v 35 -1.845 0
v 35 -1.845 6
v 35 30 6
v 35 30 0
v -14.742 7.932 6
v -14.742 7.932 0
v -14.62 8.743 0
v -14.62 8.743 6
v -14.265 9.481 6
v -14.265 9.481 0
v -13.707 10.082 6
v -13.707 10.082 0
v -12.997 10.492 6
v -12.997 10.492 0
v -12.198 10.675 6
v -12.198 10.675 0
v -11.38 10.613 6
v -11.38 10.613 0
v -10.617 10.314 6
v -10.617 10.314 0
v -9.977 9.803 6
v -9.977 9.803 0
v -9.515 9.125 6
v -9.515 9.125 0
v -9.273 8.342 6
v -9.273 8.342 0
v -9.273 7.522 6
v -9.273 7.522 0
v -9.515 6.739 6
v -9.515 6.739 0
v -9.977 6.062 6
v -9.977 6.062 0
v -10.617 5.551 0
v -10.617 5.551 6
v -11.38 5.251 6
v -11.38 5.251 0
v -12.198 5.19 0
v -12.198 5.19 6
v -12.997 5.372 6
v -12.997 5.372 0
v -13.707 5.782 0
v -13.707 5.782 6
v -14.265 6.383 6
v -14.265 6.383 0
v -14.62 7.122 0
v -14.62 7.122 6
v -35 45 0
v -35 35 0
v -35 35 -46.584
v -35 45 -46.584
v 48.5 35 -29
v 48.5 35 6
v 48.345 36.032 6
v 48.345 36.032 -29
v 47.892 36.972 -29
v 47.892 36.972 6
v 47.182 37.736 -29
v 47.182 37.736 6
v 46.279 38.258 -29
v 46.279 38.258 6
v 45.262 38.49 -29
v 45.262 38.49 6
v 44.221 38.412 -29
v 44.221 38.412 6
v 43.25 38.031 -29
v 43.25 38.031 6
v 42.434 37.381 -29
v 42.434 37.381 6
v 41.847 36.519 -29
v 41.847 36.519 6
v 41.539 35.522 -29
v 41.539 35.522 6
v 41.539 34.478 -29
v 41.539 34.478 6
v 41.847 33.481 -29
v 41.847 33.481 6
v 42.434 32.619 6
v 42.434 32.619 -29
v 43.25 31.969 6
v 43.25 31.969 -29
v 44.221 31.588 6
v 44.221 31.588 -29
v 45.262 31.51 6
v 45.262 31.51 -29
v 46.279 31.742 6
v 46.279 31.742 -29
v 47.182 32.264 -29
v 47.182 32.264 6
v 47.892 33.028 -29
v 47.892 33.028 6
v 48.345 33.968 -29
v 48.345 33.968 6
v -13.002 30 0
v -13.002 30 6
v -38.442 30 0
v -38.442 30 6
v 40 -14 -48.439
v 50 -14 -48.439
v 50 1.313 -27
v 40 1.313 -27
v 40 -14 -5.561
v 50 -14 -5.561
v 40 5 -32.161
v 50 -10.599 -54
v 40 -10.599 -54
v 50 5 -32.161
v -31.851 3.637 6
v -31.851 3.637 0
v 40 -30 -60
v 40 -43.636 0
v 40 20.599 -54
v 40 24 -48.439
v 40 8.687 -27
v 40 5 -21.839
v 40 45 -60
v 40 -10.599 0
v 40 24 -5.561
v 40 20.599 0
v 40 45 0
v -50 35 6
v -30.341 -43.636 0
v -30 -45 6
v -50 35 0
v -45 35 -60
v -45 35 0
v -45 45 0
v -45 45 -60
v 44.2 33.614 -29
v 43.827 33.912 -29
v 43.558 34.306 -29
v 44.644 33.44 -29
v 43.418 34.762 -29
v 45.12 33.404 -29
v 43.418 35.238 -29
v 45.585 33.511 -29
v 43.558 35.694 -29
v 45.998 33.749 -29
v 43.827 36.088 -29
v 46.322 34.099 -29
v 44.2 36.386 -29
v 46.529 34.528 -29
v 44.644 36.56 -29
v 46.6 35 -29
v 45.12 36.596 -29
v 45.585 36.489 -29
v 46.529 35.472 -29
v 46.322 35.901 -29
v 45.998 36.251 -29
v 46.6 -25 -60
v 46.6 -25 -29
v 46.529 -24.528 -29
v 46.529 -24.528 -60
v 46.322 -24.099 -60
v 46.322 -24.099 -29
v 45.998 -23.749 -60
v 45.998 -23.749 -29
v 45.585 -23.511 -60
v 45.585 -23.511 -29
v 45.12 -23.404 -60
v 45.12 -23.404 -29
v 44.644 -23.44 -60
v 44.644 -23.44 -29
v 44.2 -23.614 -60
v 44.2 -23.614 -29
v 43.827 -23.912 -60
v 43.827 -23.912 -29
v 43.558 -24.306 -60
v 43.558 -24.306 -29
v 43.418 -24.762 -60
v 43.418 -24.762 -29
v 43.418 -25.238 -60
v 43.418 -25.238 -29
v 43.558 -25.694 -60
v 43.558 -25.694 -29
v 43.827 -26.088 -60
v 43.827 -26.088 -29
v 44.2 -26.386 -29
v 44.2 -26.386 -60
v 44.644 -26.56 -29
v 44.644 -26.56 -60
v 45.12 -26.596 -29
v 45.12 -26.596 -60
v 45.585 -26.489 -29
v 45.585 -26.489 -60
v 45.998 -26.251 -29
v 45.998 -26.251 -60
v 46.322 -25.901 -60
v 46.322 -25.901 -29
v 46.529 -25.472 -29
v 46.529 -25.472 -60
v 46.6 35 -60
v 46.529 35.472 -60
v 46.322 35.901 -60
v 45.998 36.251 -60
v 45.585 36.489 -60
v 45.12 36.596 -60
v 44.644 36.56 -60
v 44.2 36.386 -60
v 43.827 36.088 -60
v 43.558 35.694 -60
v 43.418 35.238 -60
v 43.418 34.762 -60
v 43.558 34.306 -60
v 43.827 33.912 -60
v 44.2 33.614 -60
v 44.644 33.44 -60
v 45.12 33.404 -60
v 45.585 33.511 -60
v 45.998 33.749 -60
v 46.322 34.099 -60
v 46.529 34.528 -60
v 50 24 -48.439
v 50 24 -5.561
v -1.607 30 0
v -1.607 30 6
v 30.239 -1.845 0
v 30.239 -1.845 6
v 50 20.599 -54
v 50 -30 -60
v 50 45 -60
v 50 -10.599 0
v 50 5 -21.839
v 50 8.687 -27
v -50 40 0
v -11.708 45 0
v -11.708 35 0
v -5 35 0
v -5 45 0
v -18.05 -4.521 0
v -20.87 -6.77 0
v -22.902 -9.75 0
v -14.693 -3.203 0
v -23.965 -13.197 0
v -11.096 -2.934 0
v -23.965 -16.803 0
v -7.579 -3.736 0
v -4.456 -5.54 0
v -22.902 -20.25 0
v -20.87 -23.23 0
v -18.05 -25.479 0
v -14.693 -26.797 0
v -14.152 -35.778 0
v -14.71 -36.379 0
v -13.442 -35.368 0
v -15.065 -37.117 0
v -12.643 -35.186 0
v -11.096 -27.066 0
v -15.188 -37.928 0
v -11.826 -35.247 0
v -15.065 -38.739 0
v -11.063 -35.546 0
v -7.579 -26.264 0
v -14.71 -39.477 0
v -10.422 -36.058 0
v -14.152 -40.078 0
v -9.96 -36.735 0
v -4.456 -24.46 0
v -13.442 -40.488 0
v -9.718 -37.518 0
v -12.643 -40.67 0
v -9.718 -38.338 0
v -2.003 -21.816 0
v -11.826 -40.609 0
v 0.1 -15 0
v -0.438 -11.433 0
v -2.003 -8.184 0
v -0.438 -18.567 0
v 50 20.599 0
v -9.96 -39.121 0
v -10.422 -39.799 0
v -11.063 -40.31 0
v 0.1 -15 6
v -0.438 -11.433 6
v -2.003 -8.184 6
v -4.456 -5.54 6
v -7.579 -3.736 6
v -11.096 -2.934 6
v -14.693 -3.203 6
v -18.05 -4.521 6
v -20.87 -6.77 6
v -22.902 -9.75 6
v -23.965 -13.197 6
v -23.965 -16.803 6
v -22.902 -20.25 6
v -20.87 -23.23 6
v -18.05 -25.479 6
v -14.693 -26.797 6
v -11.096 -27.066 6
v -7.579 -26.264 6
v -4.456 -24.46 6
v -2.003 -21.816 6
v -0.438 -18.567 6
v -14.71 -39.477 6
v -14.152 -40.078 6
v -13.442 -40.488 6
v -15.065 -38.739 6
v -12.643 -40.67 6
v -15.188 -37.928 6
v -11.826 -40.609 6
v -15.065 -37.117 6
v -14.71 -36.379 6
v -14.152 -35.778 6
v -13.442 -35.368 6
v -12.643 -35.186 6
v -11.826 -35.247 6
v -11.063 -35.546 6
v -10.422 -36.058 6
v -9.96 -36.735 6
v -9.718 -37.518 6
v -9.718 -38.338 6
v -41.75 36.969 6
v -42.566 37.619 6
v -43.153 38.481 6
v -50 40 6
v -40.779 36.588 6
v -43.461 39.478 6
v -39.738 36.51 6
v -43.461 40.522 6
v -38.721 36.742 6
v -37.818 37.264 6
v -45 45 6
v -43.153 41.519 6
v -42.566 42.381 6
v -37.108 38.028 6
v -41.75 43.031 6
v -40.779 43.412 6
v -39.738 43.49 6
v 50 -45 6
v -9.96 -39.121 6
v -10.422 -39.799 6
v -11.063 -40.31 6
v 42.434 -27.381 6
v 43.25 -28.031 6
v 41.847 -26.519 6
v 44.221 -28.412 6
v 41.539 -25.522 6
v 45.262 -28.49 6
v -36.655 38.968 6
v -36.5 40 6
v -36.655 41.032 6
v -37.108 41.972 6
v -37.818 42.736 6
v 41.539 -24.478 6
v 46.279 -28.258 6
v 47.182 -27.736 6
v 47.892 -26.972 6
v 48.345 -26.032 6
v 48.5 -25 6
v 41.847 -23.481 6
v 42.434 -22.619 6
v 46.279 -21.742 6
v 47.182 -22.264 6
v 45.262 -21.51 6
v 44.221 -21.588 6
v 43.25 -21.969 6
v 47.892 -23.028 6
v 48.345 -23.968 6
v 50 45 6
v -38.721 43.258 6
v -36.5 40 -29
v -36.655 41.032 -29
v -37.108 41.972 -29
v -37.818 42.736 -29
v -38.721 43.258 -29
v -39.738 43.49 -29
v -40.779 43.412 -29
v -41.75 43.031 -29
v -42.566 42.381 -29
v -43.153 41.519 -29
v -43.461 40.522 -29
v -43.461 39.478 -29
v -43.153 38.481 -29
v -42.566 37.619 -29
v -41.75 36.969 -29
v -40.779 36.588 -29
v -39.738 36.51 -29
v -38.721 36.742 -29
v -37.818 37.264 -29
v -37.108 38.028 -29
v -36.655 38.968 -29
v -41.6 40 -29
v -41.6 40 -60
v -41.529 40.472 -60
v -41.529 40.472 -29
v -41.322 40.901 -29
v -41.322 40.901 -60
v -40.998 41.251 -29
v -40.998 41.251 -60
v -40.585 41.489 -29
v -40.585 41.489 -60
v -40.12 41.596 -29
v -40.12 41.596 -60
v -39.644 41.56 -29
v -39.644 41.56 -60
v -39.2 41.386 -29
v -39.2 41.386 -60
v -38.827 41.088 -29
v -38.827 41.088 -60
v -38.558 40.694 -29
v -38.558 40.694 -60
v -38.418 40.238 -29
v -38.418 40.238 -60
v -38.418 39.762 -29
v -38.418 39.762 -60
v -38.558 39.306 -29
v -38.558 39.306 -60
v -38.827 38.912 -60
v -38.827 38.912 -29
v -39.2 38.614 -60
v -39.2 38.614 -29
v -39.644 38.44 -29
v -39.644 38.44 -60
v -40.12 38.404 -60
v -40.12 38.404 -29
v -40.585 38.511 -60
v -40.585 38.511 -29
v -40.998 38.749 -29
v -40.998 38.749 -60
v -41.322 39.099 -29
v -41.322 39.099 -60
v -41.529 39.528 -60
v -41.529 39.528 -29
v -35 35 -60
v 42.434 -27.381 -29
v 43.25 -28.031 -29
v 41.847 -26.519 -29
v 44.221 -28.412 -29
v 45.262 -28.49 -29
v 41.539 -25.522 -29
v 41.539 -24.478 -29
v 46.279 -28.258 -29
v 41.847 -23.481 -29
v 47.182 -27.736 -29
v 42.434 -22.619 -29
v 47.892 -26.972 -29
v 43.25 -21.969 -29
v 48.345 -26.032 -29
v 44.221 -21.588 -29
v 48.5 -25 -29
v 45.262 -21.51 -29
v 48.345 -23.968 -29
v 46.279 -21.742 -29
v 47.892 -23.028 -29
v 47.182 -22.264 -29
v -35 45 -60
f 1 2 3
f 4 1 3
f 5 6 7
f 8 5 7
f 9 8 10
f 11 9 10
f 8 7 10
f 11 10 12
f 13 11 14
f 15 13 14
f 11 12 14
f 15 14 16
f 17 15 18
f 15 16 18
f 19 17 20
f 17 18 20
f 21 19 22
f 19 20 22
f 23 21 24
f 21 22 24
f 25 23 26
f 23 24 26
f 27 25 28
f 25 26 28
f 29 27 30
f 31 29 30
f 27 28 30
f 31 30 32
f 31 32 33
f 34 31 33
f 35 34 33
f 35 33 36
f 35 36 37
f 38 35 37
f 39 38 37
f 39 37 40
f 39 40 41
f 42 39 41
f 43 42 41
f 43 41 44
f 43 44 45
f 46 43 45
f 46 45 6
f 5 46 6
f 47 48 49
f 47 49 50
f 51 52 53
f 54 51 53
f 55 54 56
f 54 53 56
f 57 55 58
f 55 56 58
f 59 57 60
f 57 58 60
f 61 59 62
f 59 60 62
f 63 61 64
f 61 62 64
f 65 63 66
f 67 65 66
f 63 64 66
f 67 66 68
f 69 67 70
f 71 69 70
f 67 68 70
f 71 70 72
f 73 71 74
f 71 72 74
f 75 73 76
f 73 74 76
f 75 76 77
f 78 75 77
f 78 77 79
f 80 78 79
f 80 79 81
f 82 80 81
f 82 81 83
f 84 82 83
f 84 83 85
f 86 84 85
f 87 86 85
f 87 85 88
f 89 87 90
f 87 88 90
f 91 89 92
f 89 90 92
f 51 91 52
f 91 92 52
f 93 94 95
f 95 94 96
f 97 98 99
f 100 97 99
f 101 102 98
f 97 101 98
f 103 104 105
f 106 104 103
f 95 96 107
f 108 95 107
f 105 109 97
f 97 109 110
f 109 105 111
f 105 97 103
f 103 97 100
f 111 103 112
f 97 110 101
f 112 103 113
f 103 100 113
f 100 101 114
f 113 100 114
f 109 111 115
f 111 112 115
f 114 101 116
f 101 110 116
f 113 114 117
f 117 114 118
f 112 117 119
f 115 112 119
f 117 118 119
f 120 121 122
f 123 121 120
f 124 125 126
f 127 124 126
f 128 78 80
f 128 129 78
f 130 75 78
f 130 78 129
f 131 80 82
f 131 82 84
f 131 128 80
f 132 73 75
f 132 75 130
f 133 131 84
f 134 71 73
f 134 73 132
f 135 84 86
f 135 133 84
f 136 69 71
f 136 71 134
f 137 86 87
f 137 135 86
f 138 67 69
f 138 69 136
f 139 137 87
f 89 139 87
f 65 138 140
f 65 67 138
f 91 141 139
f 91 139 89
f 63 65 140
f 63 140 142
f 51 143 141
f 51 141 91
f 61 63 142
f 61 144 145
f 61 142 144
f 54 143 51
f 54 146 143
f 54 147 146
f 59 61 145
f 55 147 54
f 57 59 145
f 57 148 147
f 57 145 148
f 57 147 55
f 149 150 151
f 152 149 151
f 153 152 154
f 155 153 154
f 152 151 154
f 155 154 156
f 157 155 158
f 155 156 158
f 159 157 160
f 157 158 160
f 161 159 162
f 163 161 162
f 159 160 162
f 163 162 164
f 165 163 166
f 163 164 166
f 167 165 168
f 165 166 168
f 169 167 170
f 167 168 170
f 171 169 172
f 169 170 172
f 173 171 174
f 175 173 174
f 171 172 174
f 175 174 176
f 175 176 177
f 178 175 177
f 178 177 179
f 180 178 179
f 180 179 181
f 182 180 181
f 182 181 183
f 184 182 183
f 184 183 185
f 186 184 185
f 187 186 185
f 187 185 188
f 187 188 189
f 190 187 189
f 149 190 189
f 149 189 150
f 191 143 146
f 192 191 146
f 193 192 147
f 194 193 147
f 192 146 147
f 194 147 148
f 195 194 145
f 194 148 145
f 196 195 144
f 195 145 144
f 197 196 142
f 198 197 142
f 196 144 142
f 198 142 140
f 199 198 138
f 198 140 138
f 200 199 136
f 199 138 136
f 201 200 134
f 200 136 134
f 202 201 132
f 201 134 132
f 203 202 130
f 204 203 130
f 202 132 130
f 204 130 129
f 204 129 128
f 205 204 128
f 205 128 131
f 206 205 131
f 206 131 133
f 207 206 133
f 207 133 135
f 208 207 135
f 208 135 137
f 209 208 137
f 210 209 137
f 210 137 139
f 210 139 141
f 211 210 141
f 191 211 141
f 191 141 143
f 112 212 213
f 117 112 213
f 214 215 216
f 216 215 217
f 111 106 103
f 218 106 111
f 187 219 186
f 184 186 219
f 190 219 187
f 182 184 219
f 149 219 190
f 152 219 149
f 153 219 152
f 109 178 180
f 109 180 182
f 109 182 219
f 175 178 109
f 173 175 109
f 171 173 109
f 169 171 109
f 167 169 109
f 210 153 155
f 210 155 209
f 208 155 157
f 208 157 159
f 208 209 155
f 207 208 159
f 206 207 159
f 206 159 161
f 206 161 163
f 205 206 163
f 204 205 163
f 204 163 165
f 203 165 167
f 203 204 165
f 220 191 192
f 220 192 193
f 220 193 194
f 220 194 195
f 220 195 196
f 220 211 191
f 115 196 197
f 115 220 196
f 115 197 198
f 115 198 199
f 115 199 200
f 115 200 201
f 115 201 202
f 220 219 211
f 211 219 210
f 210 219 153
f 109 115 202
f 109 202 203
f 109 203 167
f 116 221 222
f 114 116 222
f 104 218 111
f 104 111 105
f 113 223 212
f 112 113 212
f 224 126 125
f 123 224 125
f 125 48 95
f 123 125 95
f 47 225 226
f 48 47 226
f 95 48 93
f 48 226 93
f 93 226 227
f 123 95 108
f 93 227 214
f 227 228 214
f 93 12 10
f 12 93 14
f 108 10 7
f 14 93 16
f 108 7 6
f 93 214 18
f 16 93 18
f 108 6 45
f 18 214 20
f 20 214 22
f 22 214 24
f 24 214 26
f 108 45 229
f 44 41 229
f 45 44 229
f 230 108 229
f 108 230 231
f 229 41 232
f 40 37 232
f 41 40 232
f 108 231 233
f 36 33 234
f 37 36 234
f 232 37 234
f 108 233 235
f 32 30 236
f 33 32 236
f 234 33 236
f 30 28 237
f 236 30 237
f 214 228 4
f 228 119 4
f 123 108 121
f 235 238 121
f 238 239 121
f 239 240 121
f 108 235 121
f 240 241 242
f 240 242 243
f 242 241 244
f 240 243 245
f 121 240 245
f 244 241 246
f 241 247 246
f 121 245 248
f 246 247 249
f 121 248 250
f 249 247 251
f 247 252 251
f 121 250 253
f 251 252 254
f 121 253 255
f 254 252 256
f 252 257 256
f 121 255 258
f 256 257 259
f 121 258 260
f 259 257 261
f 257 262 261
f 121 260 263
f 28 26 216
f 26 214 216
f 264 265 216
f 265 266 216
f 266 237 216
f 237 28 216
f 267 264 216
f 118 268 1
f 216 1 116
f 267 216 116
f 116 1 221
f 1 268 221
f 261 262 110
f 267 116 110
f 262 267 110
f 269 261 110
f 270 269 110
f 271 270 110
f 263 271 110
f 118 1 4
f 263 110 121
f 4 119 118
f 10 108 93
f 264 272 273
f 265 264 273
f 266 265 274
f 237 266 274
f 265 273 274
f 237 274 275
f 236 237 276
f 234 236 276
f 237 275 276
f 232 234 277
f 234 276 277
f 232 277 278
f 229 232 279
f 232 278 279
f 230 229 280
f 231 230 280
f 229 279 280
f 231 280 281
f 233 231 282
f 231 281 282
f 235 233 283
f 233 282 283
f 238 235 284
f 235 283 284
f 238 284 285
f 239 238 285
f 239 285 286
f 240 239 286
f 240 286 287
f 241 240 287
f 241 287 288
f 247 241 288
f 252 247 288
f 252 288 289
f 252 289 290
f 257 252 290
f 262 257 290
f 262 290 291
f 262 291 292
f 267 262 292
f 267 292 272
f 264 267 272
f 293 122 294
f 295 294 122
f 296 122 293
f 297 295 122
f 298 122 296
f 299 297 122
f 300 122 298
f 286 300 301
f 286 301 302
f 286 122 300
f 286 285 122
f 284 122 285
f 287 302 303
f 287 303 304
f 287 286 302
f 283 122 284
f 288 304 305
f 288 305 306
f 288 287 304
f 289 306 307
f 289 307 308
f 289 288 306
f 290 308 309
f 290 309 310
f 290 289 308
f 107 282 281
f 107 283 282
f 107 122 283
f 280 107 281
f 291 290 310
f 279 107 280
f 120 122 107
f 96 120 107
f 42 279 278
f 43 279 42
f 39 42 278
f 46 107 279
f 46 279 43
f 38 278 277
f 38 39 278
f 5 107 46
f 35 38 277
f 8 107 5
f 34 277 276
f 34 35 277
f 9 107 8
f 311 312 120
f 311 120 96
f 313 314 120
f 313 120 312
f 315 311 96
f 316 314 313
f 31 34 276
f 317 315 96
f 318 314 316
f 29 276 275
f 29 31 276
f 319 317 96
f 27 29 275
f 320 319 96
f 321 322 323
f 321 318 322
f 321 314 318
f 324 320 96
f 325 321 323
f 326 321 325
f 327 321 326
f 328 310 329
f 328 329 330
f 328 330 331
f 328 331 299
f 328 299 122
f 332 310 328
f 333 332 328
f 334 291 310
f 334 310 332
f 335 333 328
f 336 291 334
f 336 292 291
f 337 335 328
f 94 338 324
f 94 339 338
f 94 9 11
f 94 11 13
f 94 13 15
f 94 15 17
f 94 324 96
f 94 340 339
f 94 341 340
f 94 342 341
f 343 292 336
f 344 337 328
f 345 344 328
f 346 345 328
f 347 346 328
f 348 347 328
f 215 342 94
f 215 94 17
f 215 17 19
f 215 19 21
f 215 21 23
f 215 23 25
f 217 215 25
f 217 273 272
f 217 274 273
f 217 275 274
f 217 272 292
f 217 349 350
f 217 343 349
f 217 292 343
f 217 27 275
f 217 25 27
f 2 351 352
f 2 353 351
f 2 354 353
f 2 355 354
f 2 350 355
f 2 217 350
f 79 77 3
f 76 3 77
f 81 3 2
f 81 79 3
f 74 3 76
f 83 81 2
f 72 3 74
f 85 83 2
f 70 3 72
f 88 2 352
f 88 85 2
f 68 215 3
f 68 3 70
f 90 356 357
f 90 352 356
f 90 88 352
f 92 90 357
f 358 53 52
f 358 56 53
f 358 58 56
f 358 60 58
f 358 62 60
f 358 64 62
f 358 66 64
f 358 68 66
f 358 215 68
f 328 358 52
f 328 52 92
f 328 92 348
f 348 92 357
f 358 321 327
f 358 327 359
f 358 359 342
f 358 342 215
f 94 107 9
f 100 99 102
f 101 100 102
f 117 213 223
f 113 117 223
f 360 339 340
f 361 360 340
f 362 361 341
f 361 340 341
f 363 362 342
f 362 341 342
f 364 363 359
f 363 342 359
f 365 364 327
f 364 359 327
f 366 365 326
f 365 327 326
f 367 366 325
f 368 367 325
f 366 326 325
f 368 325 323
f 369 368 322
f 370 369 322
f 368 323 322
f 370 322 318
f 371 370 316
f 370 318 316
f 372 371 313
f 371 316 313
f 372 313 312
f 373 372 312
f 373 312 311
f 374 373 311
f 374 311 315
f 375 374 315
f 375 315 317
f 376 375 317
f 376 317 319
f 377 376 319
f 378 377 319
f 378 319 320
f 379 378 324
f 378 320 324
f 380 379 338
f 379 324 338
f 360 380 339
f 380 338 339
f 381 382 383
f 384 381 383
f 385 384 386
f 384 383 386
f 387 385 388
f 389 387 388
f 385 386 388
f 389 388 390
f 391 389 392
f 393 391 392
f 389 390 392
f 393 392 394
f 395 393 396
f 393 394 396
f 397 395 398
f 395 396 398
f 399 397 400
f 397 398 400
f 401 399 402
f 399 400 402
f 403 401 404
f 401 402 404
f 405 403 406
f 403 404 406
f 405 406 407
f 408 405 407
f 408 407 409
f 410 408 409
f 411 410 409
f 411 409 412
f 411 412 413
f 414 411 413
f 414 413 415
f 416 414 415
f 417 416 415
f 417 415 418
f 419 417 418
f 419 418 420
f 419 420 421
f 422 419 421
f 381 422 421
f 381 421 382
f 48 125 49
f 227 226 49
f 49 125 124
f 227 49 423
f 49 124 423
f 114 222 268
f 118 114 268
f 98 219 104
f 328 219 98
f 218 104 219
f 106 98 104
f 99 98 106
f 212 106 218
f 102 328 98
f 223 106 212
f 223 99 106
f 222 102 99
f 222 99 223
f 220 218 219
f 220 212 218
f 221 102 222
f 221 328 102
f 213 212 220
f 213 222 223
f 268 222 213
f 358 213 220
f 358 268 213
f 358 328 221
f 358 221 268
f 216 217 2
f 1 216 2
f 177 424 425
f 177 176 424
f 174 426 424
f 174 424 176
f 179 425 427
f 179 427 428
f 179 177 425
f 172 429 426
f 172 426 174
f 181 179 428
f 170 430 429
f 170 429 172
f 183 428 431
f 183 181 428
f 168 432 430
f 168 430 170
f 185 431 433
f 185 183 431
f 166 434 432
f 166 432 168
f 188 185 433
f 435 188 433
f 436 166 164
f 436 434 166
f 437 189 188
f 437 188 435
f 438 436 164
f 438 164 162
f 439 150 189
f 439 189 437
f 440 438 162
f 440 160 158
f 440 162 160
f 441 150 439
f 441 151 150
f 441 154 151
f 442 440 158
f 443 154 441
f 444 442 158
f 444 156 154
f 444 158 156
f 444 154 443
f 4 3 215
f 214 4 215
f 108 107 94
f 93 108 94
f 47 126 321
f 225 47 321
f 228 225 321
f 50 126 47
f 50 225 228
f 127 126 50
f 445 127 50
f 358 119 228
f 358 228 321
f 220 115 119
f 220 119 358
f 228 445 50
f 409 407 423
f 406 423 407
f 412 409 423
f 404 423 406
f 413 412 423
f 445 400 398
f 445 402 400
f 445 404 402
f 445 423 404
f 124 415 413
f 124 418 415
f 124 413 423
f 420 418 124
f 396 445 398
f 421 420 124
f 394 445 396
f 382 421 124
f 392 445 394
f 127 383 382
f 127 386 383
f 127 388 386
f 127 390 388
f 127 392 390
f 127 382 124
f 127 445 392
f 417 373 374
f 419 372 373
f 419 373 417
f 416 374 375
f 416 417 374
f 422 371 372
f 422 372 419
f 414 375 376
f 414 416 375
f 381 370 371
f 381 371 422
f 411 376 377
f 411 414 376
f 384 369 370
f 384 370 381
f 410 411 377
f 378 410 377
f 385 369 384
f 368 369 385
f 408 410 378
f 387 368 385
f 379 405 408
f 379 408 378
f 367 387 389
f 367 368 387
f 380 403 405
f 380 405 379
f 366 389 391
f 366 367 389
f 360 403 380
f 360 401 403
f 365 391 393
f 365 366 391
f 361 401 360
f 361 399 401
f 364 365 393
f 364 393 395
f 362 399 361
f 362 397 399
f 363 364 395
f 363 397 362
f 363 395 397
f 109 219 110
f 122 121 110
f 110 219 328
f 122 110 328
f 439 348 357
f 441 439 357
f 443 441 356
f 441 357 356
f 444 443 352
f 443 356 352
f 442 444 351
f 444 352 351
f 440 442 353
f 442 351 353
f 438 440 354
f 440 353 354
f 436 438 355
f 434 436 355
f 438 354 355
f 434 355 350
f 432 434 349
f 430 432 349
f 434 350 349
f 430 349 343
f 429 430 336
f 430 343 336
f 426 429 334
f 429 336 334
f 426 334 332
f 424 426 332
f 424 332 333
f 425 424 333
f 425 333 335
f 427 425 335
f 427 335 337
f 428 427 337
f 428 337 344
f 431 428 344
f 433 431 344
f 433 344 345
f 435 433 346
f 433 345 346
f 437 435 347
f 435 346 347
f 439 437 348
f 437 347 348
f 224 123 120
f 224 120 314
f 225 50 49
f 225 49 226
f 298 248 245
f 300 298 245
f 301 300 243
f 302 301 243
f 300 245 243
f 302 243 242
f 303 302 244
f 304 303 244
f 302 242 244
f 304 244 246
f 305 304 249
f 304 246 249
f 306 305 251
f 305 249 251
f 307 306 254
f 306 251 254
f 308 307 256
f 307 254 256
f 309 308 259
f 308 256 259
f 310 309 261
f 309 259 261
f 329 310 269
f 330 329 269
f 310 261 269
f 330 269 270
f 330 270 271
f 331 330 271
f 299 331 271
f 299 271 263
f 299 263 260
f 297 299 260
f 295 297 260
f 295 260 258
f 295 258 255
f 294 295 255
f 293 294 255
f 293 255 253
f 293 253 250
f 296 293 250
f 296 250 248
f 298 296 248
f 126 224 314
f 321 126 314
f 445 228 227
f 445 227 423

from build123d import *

# Parameters (mm, degrees)
SKETCH1_W               = 100
SKETCH1_H               = 90
BOSS_EXTRUDE1_DEPTH     = 6
CUT_EXTRUDE1_REACH      = 69.535
SKETCH2_R               = 12.1
SKETCH3_W               = 10
SKETCH3_H               = 90
BOSS_EXTRUDE2_DEPTH     = 60
SKETCH5_W               = 10
SKETCH5_H               = 10
BOSS_EXTRUDE4_DEPTH     = 60
SKETCH7_R               = 3.5
CUT_EXTRUDE2_DEPTH      = 35
CUT_EXTRUDE3_REACH      = 77.829
SKETCH8_R               = 1.6
CUT_EXTRUDE4_REACH      = 96.239
SKETCH9_R               = 1.6
SKETCH10_R              = 3.5
CUT_EXTRUDE5_DEPTH      = 35
M5_CLEARANCE_HOLE2_D    = 5.5
CUT_EXTRUDE7_REACH      = 127
CUT_EXTRUDE8_DEPTH      = 95.23905772
CUT_EXTRUDE8_DEPTH_BACK = 35
CHAMFER1_SIZE           = 5
CUT_EXTRUDE9_DEPTH      = 35
CUT_EXTRUDE10_REACH     = 127
BOSS_EXTRUDE5_DEPTH     = 10


with BuildPart() as part:
    # Sketch1 → Boss-Extrude1 (new body)
    with BuildSketch(Plane.XY):
        Rectangle(SKETCH1_W, SKETCH1_H)
    extrude(amount=BOSS_EXTRUDE1_DEPTH)

    # Sketch2 → Cut-Extrude1 (cut, up to next)
    with BuildSketch(Plane.XY.offset(6), mode=Mode.PRIVATE) as cut_extrude1_sk1:
        with Locations((-12, -15)):
            Circle(SKETCH2_R)
    cut_extrude1_tool1 = extrude(cut_extrude1_sk1.sketch, amount=-CUT_EXTRUDE1_REACH, mode=Mode.PRIVATE) & part.part
    add(cut_extrude1_tool1.solids().sort_by_distance((-12, -15, 6))[0], mode=Mode.SUBTRACT)

    # Sketch3 → Boss-Extrude2 (add)
    with BuildSketch(Plane(origin=(0, 0, 0), x_dir=(-1, 0, 0), z_dir=(0, 0, -1))):
        with Locations((-45, 0)):
            Rectangle(SKETCH3_W, SKETCH3_H)
    extrude(amount=BOSS_EXTRUDE2_DEPTH)

    # Sketch5 → Boss-Extrude4 (add)
    with BuildSketch(Plane(origin=(0, 0, 0), x_dir=(-1, 0, 0), z_dir=(0, 0, -1))):
        with Locations((40, 40)):
            Rectangle(SKETCH5_W, SKETCH5_H)
    extrude(amount=BOSS_EXTRUDE4_DEPTH)

    # Sketch7 → Cut-Extrude2 (cut)
    with BuildSketch(Plane.XY.offset(6)):
        with Locations((45, 35)):
            Circle(SKETCH7_R)
        with Locations((45, -25)):
            Circle(SKETCH7_R)
    extrude(amount=-CUT_EXTRUDE2_DEPTH, mode=Mode.SUBTRACT)

    # Sketch8 → Cut-Extrude3 (cut, up to next)
    with BuildSketch(Plane.XY.offset(-29), mode=Mode.PRIVATE) as cut_extrude3_sk1:
        with Locations((45, 35)):
            Circle(SKETCH8_R)
    cut_extrude3_tool1 = extrude(cut_extrude3_sk1.sketch, amount=-CUT_EXTRUDE3_REACH, mode=Mode.PRIVATE) & part.part
    # Sketch8 → Cut-Extrude3 (cut, up to next)
    with BuildSketch(Plane.XY.offset(-29), mode=Mode.PRIVATE) as cut_extrude3_sk2:
        with Locations((45, -25)):
            Circle(SKETCH8_R)
    cut_extrude3_tool2 = extrude(cut_extrude3_sk2.sketch, amount=-CUT_EXTRUDE3_REACH, mode=Mode.PRIVATE) & part.part
    add(cut_extrude3_tool1.solids().sort_by_distance((45, 35, -29))[0], mode=Mode.SUBTRACT)
    add(cut_extrude3_tool2.solids().sort_by_distance((45, -25, -29))[0], mode=Mode.SUBTRACT)

    # Sketch9 → Cut-Extrude4 (cut, up to next)
    with BuildSketch(Plane(origin=(0, 0, -60), x_dir=(-1, 0, 0), z_dir=(0, 0, -1)), mode=Mode.PRIVATE) as cut_extrude4_sk1:
        with Locations((40, 40)):
            Circle(SKETCH9_R)
    cut_extrude4_tool1 = extrude(cut_extrude4_sk1.sketch, amount=-CUT_EXTRUDE4_REACH, mode=Mode.PRIVATE) & part.part
    add(cut_extrude4_tool1.solids().sort_by_distance((-40, 40, -60))[0], mode=Mode.SUBTRACT)

    # Sketch10 → Cut-Extrude5 (cut)
    with BuildSketch(Plane.XY.offset(6)):
        with Locations((-40, 40)):
            Circle(SKETCH10_R)
    extrude(amount=-CUT_EXTRUDE5_DEPTH, mode=Mode.SUBTRACT)

    # M5 Clearance Hole2 (through all)
    with Locations(Plane.XY.offset(6)):
        with Locations((-11.992398496, 7.932190932), (-12.437514592, -37.928041631)):
            Hole(M5_CLEARANCE_HOLE2_D / 2)

    # Sketch16 → Cut-Extrude7 (cut, up to next)
    with BuildSketch(Plane(origin=(50, 0, 0), x_dir=(0, 0, -1), z_dir=(1, 0, 0)), mode=Mode.PRIVATE) as cut_extrude7_sk1:
        Polygon((0, 20.599003457), (0, -10.599003457), (21.83860484, 5), align=None)
    cut_extrude7_tool1 = extrude(cut_extrude7_sk1.sketch, amount=-CUT_EXTRUDE7_REACH, mode=Mode.PRIVATE) & part.part
    # Sketch16 → Cut-Extrude7 (cut, up to next)
    with BuildSketch(Plane(origin=(50, 0, 0), x_dir=(0, 0, -1), z_dir=(1, 0, 0)), mode=Mode.PRIVATE) as cut_extrude7_sk2:
        Polygon((54, -10.599003457), (32.16139516, 5), (54, 20.599003457), align=None)
    cut_extrude7_tool2 = extrude(cut_extrude7_sk2.sketch, amount=-CUT_EXTRUDE7_REACH, mode=Mode.PRIVATE) & part.part
    # Sketch16 → Cut-Extrude7 (cut, up to next)
    with BuildSketch(Plane(origin=(50, 0, 0), x_dir=(0, 0, -1), z_dir=(1, 0, 0)), mode=Mode.PRIVATE) as cut_extrude7_sk3:
        Polygon((27, 1.313289171), (5.56139516, -14), (48.43860484, -14), align=None)
    cut_extrude7_tool3 = extrude(cut_extrude7_sk3.sketch, amount=-CUT_EXTRUDE7_REACH, mode=Mode.PRIVATE) & part.part
    # Sketch16 → Cut-Extrude7 (cut, up to next)
    with BuildSketch(Plane(origin=(50, 0, 0), x_dir=(0, 0, -1), z_dir=(1, 0, 0)), mode=Mode.PRIVATE) as cut_extrude7_sk4:
        Polygon((27, 8.686710829), (48.43860484, 24), (5.56139516, 24), align=None)
    cut_extrude7_tool4 = extrude(cut_extrude7_sk4.sketch, amount=-CUT_EXTRUDE7_REACH, mode=Mode.PRIVATE) & part.part
    add(cut_extrude7_tool1.solids().sort_by_distance((50, 5, -7.279535))[0], mode=Mode.SUBTRACT)
    add(cut_extrude7_tool2.solids().sort_by_distance((50, 5, -46.720465))[0], mode=Mode.SUBTRACT)
    add(cut_extrude7_tool3.solids().sort_by_distance((50, -8.89557, -27))[0], mode=Mode.SUBTRACT)
    add(cut_extrude7_tool4.solids().sort_by_distance((50, 18.89557, -27))[0], mode=Mode.SUBTRACT)

    # Sketch17 → Cut-Extrude8 (cut, two sides: drawn at the far end of the back side and taken through both)
    with BuildSketch(Plane.XY.offset(6).offset(-CUT_EXTRUDE8_DEPTH_BACK)):
        Polygon((-114.544785815, 293.179143259), (-50, 35), (-30, -45), (34.544785815, -303.179143259), (-481.813500704, -432.268714889), (-630.903072333, 164.08957163), align=None)
    extrude(amount=CUT_EXTRUDE8_DEPTH + CUT_EXTRUDE8_DEPTH_BACK, mode=Mode.SUBTRACT)

    # Chamfer1
    chamfer1_edges = [part.edges().sort_by_distance(p)[0] for p in [
        (-50, 45, 3),
    ]]
    chamfer(chamfer1_edges, length=CHAMFER1_SIZE)

    # Sketch18 → Cut-Extrude9 (cut)
    with BuildSketch(Plane.XY.offset(6)):
        Polygon((-38.442235936, 30), (-31.851459244, 3.636893232), (-13.002338185, 30), align=None)
        Polygon((-1.606548225, 30), (30.238919993, -1.845468218), (35, -1.845468218), (35, 30), align=None)
    extrude(amount=-CUT_EXTRUDE9_DEPTH, mode=Mode.SUBTRACT)

    # Sketch19 → Cut-Extrude10 (cut, up to next)
    with BuildSketch(Plane(origin=(50, 0, 0), x_dir=(0, 0, -1), z_dir=(1, 0, 0)), mode=Mode.PRIVATE) as cut_extrude10_sk1:
        Polygon((60, -30), (-6, -45), (60, -45), align=None)
    cut_extrude10_tool1 = extrude(cut_extrude10_sk1.sketch, amount=-CUT_EXTRUDE10_REACH, mode=Mode.PRIVATE) & part.part
    add(cut_extrude10_tool1.solids().sort_by_distance((50, -40, -38))[0], mode=Mode.SUBTRACT)

    # Sketch20 → Boss-Extrude5 (add)
    with BuildSketch(Plane(origin=(0, 45, 0), x_dir=(1, 0, 0), z_dir=(0, 1, 0))):
        Polygon((-5, 0), (-35, 60), (-35, 46.583592135), (-11.708203932, 0), align=None)
    extrude(amount=-BOSS_EXTRUDE5_DEPTH)


solid = part.part
